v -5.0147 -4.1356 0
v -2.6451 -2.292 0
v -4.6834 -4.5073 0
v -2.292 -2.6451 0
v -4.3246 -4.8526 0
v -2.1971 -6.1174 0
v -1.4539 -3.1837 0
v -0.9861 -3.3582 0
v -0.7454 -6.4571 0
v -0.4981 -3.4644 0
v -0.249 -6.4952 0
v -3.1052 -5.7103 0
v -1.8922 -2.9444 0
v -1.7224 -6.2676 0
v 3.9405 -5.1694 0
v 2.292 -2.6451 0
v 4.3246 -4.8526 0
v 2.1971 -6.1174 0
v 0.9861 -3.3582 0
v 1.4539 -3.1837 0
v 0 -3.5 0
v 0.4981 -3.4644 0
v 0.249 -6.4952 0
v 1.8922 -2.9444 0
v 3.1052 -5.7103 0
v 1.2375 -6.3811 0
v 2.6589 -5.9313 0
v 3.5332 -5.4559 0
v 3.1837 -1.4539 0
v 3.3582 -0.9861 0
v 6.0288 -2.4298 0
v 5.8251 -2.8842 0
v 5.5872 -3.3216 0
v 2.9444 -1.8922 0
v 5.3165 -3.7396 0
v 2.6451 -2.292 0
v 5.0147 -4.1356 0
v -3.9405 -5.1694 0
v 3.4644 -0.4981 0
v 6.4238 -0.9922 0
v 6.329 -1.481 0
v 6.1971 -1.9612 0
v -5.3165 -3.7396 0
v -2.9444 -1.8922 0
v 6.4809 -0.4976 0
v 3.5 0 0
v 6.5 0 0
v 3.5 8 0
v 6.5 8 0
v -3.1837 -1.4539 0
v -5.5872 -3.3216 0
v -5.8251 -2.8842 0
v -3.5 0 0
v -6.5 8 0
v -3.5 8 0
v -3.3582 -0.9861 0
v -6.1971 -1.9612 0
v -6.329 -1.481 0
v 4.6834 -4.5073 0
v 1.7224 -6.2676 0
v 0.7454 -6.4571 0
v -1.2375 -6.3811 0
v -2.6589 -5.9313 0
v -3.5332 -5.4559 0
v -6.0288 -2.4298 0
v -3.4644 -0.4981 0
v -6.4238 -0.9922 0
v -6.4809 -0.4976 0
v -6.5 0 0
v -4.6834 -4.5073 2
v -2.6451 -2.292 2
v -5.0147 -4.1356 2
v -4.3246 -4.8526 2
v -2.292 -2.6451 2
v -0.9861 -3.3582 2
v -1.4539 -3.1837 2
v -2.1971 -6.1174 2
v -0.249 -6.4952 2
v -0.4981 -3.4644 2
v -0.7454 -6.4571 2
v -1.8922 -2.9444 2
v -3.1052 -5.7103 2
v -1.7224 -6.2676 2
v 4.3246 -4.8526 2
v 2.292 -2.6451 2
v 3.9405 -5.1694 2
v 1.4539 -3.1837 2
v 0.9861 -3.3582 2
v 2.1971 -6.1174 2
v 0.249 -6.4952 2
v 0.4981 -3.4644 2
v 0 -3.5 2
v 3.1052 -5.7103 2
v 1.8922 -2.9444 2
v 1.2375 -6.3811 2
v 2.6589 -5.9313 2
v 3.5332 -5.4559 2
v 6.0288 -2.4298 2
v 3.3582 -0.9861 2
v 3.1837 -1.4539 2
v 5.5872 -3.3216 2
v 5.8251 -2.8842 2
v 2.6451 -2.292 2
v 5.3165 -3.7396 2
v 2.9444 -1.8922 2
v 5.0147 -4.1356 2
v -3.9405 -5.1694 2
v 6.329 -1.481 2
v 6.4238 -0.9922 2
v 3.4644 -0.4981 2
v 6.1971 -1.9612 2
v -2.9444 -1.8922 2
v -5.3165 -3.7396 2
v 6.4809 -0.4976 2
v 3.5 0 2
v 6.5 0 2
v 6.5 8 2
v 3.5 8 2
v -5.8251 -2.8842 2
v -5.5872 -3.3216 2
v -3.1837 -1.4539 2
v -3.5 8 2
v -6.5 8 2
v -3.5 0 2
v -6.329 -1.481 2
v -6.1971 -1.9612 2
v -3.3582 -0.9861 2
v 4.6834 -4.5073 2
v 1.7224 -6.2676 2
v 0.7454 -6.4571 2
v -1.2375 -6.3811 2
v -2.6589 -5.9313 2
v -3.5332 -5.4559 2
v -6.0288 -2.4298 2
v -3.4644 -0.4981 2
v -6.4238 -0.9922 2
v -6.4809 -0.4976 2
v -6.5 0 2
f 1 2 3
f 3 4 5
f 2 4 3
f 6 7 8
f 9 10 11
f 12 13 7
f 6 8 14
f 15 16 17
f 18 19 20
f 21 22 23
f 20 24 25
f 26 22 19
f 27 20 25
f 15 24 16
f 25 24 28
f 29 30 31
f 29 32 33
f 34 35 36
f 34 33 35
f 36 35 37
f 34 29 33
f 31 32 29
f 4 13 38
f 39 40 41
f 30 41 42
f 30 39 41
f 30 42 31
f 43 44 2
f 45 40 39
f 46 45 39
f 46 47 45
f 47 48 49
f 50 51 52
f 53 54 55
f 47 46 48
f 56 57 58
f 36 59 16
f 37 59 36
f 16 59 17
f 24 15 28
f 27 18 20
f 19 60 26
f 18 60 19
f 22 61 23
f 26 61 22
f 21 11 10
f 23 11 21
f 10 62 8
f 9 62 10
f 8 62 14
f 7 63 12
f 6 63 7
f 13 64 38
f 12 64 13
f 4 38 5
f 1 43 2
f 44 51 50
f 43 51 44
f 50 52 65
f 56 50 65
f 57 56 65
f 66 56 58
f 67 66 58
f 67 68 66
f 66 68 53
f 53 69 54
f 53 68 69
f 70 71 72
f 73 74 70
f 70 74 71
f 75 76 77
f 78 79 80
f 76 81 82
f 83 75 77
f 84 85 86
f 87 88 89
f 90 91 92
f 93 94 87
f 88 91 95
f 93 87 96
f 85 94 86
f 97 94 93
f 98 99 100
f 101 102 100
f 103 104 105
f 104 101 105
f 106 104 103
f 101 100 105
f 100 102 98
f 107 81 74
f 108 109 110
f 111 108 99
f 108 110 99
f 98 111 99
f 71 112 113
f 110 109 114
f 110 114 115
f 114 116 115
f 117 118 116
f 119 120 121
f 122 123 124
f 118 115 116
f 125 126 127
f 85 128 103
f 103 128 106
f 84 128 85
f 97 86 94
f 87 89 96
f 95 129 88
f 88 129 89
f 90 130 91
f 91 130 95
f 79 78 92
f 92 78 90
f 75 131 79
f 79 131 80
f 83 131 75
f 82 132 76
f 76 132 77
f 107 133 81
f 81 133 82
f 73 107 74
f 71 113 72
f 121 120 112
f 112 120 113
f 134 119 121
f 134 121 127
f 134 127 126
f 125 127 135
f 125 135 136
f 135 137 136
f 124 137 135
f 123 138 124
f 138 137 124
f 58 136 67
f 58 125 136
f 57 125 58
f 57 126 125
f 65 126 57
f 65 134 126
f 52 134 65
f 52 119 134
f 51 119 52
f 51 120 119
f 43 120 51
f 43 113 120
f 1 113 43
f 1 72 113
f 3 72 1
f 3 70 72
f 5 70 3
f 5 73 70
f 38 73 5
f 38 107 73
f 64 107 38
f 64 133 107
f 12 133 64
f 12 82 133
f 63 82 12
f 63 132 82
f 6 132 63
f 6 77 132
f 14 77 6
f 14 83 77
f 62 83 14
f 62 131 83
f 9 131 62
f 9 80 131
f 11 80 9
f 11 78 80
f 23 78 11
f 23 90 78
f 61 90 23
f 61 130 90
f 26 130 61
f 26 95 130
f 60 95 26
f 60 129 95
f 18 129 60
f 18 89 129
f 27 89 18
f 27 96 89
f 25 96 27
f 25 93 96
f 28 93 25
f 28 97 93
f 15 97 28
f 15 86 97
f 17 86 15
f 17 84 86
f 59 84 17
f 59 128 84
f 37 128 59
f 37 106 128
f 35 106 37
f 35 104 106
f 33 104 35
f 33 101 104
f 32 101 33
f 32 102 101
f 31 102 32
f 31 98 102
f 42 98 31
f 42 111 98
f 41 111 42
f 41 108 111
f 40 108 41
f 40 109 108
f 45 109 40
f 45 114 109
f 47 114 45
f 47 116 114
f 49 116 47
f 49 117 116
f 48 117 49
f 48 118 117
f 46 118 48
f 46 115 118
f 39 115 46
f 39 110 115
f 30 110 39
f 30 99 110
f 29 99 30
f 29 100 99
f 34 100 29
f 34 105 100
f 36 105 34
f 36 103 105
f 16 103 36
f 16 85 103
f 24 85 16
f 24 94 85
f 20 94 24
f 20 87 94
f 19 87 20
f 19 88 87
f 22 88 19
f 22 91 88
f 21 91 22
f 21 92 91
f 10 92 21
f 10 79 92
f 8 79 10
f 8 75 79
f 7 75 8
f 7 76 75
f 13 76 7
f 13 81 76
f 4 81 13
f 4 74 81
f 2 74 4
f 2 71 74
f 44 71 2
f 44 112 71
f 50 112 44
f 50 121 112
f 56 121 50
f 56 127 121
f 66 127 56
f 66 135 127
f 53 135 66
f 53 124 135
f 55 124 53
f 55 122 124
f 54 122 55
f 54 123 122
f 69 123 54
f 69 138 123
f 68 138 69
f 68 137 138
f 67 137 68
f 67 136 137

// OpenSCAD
//a part that makes the suction cup of a car phone holder hold better
$fs=1/2;
$fa=1/2;
inner=7;
outer=13;
thickness=2;
length=8;
wall=(outer-inner)/2;
linear_extrude(thickness) {
  difference() {
    circle(d=outer);
    circle(d=inner);
    translate([0,outer/2])square([outer,outer],center=true);
  }
  translate([inner/2,0])square([wall,length]);
  translate([-outer/2,0])square([wall,length]);
}
